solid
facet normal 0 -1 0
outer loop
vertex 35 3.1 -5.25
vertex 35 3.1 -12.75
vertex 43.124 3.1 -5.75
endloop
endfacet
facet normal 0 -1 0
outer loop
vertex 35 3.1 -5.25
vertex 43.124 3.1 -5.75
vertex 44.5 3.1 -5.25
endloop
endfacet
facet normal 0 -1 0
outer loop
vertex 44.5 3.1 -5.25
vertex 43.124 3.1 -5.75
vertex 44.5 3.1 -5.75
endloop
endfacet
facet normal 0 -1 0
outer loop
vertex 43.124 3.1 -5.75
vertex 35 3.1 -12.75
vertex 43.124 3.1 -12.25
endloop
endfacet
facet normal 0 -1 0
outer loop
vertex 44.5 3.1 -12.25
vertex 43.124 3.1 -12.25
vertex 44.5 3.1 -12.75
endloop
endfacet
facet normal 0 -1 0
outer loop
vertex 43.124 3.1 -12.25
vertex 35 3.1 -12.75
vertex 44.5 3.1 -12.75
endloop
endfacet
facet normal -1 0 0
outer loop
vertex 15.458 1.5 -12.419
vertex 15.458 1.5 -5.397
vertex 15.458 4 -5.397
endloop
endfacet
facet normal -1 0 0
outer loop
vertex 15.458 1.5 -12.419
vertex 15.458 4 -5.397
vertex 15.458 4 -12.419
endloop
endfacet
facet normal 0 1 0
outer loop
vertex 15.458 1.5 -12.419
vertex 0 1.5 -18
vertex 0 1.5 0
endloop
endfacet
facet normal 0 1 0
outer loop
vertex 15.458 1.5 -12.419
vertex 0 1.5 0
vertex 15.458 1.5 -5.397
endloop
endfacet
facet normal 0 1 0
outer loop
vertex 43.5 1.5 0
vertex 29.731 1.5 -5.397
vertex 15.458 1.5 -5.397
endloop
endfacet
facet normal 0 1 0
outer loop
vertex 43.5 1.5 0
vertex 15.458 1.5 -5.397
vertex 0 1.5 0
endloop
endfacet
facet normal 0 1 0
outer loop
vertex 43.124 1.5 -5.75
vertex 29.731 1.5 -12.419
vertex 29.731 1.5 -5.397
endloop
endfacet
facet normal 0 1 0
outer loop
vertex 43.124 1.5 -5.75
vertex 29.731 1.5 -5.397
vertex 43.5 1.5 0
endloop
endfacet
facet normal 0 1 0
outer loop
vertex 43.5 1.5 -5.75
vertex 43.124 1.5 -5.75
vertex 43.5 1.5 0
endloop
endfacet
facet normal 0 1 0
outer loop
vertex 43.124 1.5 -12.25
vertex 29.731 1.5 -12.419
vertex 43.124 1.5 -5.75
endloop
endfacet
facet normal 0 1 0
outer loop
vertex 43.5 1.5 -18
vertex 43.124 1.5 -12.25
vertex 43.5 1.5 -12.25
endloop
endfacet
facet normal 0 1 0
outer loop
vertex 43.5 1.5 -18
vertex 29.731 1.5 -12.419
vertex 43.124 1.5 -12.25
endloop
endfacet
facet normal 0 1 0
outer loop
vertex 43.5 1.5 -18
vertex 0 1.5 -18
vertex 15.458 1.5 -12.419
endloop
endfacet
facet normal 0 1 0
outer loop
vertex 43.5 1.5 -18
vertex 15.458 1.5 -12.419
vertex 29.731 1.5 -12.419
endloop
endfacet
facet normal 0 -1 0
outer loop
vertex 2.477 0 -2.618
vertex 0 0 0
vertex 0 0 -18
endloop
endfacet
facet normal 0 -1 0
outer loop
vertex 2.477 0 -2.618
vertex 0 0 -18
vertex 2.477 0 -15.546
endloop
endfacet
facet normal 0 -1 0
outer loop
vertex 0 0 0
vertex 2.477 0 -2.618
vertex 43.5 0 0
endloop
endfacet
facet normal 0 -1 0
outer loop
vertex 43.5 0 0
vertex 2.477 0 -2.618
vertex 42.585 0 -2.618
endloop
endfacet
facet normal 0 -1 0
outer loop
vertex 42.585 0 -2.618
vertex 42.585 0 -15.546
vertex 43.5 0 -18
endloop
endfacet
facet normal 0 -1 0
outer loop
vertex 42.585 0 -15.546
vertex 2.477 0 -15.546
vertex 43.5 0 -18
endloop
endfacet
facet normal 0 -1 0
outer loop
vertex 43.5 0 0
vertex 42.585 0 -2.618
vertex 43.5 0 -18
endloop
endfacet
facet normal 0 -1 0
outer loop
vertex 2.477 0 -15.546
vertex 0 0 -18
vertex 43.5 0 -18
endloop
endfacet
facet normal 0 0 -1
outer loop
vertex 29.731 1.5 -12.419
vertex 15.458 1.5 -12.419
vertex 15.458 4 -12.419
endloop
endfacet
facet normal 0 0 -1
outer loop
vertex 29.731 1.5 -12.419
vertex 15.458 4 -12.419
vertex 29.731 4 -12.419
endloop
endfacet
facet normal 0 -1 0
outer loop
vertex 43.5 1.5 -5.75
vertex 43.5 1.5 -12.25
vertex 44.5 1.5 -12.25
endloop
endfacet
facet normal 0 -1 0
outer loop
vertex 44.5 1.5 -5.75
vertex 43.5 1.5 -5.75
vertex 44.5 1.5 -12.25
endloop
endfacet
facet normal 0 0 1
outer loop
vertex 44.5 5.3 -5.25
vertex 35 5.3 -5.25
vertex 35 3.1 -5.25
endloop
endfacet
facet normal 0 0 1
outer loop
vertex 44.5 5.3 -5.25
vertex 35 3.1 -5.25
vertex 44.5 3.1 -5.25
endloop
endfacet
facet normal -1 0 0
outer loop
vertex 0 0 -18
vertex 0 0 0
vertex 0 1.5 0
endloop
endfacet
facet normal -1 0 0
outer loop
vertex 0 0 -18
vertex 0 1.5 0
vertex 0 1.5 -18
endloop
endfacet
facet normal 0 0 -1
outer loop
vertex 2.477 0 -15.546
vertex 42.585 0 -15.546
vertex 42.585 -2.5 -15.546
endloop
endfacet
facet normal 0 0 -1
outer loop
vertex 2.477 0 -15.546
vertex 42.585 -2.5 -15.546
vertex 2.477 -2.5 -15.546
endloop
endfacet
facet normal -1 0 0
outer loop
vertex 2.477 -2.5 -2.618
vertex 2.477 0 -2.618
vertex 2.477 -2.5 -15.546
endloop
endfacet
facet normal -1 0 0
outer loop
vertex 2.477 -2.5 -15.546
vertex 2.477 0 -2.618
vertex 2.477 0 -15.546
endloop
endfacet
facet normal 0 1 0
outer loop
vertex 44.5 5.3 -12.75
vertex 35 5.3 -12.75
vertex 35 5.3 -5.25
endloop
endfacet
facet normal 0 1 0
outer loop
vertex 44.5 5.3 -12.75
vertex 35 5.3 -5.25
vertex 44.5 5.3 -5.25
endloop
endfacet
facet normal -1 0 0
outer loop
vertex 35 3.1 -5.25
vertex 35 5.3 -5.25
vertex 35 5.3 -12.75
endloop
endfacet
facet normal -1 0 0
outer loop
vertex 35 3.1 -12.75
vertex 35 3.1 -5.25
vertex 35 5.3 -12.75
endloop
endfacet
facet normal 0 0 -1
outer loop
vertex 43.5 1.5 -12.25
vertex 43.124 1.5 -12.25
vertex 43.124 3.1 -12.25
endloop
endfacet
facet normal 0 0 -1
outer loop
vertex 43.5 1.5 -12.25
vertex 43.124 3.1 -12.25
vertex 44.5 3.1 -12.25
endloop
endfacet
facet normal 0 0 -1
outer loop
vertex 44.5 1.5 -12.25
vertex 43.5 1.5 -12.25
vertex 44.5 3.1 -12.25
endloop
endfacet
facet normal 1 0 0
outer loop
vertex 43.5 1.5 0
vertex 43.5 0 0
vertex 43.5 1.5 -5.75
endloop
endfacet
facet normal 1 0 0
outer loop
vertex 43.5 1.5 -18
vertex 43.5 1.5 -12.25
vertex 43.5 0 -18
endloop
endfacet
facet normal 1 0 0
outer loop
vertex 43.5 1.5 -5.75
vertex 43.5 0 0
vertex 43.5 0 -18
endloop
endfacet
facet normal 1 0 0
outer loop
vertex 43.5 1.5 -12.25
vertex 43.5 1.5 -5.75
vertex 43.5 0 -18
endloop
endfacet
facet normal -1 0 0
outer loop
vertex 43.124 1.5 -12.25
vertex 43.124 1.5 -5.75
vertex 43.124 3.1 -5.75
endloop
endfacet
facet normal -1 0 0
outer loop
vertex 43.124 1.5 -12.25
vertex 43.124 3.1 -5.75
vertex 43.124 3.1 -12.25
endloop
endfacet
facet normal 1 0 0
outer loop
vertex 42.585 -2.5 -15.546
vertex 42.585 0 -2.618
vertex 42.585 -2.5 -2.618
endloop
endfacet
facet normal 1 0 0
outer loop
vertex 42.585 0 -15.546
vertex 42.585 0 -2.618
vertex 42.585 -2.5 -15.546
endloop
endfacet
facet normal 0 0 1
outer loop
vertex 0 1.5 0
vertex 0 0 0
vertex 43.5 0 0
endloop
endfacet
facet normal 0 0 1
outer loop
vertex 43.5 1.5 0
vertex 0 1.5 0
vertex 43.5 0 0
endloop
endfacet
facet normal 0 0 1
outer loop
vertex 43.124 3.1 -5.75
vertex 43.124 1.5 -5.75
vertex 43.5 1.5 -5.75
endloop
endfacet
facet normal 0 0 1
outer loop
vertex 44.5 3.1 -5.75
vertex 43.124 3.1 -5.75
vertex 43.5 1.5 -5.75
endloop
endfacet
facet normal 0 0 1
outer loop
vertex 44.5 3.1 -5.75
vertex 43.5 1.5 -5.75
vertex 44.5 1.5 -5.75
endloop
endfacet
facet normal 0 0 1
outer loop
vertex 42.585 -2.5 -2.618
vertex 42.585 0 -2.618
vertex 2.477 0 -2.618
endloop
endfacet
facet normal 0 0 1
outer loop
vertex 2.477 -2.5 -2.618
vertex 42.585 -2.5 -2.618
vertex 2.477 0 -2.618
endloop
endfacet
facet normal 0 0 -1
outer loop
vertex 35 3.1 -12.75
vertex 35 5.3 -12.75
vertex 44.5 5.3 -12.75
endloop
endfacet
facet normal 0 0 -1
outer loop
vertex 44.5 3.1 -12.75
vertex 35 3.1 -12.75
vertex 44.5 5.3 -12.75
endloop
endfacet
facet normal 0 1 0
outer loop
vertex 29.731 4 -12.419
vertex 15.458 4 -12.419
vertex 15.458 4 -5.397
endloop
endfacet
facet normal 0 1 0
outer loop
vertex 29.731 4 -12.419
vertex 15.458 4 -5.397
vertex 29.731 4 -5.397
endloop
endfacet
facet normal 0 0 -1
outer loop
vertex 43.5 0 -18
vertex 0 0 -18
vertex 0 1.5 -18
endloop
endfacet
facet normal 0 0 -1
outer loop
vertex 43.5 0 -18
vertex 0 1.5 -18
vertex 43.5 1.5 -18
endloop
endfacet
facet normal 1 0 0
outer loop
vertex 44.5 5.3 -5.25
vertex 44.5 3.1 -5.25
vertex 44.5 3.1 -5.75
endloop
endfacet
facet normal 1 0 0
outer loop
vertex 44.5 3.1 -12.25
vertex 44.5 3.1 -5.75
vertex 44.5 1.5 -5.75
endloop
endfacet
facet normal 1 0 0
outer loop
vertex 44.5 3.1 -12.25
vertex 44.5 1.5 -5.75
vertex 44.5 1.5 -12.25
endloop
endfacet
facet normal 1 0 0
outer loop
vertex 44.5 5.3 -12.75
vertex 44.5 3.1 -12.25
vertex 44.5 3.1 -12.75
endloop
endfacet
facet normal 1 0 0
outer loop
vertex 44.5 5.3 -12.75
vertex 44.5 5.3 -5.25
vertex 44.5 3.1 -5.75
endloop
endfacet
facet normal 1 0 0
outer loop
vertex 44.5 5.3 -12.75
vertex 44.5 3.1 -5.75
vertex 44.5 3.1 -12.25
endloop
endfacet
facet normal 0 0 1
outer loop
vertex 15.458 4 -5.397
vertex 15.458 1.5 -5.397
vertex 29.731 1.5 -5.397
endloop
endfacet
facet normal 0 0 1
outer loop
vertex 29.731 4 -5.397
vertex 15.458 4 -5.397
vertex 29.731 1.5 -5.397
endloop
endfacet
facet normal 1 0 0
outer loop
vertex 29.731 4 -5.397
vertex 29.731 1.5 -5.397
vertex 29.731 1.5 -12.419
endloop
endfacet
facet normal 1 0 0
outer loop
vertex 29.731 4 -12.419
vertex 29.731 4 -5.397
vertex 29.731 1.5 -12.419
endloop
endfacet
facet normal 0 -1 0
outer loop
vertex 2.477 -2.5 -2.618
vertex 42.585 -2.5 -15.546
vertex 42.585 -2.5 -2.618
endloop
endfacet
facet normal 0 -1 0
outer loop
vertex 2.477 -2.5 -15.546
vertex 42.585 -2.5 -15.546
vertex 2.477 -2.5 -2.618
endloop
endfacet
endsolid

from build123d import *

# Parameters (mm, degrees)
SKETCH_1_W      = 43.5
SKETCH_1_H      = 18
EXTRUDE_1_DEPTH = 1.5
SKETCH_2_W      = 1.37636172
SKETCH_2_H      = 6.5
EXTRUDE_2_DEPTH = 3.8
SKETCH_3_W      = 9.5
SKETCH_3_H      = 7.5
EXTRUDE_7_DEPTH = 2.2
SKETCH_8_W      = 40.107603246
SKETCH_8_H      = 12.928280697
EXTRUDE_8_DEPTH = 2.5
SKETCH_9_W      = 14.27295549
SKETCH_9_H      = 7.021743376
EXTRUDE_9_DEPTH = 2.5


with BuildPart() as part:
    # Эскиз1 → Бобышка-Вытянуть1 (new body)
    with BuildSketch(Plane(origin=(0, 0, 0), x_dir=(1, 0, 0), z_dir=(0, 1, 0))):
        with Locations((21.75, 9)):
            Rectangle(SKETCH_1_W, SKETCH_1_H)
    extrude(amount=EXTRUDE_1_DEPTH)

    # Эскиз2 → Бобышка-Вытянуть2 (add)
    with BuildSketch(Plane(origin=(0, 1.5, 0), x_dir=(1, 0, 0), z_dir=(0, 1, 0))):
        with Locations((43.81181914, 9)):
            Rectangle(SKETCH_2_W, SKETCH_2_H)
    extrude(amount=EXTRUDE_2_DEPTH)

    # Эскиз3 → Бобышка-Вытянуть7 (add)
    with BuildSketch(Plane(origin=(0, 5.3, 0), x_dir=(1, 0, 0), z_dir=(0, 1, 0))):
        with Locations((39.75, 9)):
            Rectangle(SKETCH_3_W, SKETCH_3_H)
    extrude(amount=-EXTRUDE_7_DEPTH)

    # Эскиз8 → Бобышка-Вытянуть8 (add)
    with BuildSketch(Plane(origin=(0, 0, 0), x_dir=(-1, 0, 0), z_dir=(0, -1, 0))):
        with Locations((-22.53084927, 9.082336705)):
            Rectangle(SKETCH_8_W, SKETCH_8_H)
    extrude(amount=EXTRUDE_8_DEPTH)

    # Эскиз9 → Бобышка-Вытянуть9 (add)
    with BuildSketch(Plane(origin=(0, 1.5, 0), x_dir=(1, 0, 0), z_dir=(0, 1, 0))):
        with Locations((22.594203107, 8.908212505)):
            Rectangle(SKETCH_9_W, SKETCH_9_H)
    extrude(amount=EXTRUDE_9_DEPTH)


solid = part.part
